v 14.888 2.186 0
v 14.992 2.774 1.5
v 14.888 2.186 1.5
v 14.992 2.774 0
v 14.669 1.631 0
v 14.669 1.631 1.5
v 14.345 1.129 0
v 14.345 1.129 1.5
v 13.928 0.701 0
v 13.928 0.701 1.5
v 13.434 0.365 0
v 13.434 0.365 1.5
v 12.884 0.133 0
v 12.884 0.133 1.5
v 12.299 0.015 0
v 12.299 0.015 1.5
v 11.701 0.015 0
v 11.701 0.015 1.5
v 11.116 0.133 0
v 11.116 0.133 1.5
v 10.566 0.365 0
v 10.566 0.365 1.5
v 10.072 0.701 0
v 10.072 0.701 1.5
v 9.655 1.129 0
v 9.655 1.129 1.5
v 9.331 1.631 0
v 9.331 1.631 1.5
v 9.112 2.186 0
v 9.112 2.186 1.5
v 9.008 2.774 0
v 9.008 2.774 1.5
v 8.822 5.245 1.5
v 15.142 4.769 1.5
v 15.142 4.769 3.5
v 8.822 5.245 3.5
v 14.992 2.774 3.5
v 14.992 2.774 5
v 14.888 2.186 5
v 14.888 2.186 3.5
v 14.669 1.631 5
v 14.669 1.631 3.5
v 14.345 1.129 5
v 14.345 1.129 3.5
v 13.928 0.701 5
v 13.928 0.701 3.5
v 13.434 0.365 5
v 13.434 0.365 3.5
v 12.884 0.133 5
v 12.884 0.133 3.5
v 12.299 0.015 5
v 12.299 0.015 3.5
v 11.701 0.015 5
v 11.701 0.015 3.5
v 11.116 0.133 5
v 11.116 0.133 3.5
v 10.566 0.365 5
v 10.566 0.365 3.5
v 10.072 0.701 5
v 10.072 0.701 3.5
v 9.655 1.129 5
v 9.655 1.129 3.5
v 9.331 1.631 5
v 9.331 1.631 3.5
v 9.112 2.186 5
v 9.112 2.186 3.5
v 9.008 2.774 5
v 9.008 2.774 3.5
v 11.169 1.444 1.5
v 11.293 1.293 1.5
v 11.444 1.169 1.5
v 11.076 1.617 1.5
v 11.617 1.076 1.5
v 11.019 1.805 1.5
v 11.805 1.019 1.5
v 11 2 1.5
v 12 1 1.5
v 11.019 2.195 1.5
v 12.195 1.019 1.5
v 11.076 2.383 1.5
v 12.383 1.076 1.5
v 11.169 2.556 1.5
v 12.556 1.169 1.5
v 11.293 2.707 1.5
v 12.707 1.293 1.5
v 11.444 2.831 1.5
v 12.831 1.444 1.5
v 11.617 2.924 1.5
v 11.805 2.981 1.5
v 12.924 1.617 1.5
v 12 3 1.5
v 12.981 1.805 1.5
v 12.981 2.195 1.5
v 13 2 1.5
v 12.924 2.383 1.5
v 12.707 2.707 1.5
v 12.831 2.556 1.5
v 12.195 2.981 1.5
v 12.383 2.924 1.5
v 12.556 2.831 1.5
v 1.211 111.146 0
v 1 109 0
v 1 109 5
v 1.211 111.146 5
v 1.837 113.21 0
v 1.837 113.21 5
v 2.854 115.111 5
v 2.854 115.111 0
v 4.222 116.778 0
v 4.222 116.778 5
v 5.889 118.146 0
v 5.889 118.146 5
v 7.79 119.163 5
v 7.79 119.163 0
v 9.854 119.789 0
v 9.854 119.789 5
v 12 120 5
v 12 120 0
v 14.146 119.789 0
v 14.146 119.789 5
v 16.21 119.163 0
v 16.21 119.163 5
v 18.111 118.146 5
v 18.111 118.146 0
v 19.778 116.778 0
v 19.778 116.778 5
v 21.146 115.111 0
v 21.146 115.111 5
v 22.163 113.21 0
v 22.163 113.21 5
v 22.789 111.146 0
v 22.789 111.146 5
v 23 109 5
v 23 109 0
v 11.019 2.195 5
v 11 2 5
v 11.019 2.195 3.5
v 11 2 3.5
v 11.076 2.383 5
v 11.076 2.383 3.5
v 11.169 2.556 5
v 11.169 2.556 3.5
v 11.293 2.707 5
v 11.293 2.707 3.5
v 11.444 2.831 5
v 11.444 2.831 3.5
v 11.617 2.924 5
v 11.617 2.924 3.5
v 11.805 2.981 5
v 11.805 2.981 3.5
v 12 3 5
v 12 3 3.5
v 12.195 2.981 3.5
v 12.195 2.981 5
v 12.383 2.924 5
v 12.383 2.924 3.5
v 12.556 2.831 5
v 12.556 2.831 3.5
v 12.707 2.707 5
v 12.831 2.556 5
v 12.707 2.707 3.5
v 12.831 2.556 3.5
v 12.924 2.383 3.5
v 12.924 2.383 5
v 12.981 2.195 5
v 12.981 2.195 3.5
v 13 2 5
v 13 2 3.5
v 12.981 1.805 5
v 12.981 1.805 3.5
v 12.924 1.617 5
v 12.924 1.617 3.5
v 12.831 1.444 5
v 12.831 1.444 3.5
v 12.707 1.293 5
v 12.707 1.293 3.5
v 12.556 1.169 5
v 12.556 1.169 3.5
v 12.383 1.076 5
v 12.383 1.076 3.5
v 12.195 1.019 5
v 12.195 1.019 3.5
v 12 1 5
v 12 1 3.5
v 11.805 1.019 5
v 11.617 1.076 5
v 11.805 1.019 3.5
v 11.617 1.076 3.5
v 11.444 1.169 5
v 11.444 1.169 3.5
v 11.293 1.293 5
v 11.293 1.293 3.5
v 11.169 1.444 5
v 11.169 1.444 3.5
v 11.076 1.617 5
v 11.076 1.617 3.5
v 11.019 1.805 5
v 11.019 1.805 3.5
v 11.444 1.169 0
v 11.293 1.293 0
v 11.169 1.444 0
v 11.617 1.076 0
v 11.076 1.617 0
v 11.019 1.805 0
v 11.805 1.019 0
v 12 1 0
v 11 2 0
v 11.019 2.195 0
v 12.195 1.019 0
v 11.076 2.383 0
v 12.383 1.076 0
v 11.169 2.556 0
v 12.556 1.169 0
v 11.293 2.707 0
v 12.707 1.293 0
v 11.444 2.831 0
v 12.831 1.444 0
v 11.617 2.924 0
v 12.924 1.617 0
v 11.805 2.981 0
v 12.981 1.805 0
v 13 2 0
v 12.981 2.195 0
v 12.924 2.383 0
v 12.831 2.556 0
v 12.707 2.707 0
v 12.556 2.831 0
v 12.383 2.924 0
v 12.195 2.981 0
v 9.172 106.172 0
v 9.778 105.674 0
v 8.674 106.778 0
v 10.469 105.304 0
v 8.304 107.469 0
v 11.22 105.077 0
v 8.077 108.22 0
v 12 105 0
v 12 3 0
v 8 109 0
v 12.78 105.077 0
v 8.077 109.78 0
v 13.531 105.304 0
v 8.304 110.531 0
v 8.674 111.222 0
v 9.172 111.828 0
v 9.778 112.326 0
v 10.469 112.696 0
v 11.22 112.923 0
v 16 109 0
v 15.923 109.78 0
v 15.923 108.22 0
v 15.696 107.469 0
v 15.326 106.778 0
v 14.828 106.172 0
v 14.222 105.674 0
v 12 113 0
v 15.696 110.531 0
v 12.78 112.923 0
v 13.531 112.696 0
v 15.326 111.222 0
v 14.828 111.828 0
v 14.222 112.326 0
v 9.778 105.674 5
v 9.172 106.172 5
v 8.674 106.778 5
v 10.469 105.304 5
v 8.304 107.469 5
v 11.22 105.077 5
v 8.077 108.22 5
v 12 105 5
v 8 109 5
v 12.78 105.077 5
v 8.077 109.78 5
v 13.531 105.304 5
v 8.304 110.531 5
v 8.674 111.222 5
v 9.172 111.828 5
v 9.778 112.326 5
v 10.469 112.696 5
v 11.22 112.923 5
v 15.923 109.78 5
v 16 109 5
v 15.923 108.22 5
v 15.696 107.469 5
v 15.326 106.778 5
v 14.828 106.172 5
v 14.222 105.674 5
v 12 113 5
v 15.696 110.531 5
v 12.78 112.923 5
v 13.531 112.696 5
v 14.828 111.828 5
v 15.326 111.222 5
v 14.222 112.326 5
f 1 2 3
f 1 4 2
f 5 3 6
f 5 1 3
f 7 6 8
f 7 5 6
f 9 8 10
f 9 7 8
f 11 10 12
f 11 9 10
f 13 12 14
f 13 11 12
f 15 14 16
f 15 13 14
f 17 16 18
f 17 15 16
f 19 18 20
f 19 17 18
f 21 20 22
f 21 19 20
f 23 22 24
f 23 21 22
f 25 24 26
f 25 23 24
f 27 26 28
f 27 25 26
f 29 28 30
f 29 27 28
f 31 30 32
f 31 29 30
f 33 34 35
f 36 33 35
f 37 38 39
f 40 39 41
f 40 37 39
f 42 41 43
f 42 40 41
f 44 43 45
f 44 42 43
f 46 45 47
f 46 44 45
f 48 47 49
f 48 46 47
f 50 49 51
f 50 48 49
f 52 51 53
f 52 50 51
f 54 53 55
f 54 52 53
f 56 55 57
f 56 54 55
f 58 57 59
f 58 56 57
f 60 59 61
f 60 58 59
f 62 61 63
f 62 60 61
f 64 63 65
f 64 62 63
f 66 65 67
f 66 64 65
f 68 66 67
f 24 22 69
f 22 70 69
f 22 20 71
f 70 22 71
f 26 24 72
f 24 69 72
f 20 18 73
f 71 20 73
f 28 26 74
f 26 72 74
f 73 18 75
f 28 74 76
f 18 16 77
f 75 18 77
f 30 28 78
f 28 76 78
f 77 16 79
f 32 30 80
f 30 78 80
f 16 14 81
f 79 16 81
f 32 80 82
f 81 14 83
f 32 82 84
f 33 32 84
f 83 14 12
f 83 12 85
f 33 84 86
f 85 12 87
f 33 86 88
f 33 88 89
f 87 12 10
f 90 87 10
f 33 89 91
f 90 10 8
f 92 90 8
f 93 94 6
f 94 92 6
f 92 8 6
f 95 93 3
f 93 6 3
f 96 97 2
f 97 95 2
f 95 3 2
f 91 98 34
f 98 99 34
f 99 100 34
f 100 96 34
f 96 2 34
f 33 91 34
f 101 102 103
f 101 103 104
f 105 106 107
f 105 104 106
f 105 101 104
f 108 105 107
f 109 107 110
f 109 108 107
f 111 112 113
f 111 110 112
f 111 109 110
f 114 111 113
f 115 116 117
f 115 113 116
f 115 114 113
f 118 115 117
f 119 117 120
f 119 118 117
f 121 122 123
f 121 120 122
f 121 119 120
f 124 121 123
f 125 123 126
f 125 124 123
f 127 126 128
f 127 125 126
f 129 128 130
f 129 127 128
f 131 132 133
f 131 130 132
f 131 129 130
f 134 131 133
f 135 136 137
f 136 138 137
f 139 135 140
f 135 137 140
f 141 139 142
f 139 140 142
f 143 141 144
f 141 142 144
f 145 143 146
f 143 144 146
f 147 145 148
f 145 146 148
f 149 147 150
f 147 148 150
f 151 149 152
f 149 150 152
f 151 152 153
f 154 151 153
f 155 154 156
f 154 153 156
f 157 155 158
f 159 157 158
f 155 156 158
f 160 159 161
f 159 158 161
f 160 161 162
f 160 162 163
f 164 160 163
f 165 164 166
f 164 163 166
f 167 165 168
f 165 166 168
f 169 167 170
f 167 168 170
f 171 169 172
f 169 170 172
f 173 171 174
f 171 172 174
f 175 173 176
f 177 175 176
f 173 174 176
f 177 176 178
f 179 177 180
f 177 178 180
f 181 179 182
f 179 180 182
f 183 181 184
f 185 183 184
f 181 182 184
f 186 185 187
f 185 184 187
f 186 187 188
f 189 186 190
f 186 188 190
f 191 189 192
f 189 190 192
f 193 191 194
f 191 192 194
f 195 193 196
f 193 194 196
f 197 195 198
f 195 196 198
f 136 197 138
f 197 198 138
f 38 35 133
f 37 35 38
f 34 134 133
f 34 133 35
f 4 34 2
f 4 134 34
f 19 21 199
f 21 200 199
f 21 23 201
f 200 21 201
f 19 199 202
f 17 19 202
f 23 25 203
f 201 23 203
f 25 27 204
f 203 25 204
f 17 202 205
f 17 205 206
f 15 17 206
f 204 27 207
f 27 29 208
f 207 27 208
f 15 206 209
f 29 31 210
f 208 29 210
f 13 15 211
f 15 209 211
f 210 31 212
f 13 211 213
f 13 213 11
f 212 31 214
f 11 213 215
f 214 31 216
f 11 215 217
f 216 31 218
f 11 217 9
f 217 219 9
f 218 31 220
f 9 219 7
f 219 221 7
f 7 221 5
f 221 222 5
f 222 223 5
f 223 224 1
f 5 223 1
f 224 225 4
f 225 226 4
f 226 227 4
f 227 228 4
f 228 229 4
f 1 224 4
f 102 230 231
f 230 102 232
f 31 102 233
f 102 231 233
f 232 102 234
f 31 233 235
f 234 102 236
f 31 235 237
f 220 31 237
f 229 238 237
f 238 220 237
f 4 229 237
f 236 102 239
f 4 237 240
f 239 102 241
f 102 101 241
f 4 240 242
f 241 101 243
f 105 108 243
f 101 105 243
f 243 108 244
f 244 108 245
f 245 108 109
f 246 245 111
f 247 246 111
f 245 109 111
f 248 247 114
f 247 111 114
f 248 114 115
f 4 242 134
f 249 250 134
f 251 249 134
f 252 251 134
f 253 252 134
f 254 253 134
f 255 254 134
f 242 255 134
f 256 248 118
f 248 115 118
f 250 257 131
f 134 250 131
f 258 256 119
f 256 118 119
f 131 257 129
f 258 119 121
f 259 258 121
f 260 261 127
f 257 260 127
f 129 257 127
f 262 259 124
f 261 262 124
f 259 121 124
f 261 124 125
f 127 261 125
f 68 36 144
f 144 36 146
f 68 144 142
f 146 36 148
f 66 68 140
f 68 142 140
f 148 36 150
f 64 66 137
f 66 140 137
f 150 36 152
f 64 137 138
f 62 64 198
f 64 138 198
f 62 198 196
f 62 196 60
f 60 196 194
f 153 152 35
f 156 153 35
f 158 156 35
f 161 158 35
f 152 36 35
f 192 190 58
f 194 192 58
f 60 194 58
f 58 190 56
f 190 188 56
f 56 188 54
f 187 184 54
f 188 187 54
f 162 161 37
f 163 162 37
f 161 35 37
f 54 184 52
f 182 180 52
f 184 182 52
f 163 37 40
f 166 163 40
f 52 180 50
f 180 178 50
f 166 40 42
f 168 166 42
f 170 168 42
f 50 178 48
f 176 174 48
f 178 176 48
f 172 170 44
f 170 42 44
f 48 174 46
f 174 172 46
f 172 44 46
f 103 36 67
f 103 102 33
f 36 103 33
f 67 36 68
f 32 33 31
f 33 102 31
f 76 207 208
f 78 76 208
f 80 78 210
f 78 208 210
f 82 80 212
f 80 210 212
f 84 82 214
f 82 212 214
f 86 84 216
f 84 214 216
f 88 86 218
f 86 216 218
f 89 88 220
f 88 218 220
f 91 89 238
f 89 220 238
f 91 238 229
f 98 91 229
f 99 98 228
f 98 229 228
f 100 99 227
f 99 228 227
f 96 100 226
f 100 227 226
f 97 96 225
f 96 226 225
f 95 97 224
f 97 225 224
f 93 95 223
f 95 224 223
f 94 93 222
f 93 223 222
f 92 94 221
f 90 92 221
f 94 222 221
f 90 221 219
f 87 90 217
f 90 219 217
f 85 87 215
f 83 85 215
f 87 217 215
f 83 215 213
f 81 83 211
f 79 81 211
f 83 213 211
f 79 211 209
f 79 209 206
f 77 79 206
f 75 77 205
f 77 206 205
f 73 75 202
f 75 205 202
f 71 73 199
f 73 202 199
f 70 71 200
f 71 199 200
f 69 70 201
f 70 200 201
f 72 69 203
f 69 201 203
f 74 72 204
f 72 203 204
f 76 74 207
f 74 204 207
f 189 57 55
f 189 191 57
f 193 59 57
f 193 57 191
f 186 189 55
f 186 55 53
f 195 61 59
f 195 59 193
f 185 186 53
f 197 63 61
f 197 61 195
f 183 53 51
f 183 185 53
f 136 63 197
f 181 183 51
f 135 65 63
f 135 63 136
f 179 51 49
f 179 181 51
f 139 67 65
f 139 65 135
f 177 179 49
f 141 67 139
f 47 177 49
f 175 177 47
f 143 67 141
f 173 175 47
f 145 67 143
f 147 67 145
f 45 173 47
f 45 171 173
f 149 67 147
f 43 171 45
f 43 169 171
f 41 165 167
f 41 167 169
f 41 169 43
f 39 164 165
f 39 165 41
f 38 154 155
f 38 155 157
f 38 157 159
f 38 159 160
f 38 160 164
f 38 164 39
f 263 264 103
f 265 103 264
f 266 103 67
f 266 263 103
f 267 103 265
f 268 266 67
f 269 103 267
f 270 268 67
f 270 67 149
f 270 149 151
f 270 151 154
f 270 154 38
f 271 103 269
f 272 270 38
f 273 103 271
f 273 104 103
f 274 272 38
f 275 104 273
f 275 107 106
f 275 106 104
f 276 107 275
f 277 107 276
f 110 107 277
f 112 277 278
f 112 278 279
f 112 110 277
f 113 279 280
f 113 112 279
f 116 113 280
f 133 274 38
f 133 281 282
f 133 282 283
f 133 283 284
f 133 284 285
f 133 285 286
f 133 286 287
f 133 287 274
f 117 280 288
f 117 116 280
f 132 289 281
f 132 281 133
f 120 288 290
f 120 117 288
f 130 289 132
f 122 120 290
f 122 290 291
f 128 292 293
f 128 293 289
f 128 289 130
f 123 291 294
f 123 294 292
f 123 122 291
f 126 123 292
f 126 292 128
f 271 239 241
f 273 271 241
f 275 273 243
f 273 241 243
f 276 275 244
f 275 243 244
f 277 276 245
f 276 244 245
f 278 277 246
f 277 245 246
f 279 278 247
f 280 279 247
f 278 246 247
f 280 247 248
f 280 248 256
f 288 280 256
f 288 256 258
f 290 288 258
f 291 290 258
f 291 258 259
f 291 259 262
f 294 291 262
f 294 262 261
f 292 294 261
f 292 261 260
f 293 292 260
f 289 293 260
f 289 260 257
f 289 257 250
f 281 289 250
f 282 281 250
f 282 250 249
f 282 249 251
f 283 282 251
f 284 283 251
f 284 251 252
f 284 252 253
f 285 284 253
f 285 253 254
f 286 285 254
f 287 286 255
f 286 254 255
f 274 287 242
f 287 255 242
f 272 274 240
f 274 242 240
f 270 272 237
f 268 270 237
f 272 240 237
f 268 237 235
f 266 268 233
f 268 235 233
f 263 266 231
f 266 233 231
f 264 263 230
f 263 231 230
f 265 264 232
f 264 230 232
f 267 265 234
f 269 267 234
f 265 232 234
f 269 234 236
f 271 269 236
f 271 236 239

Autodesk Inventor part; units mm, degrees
ref_plane "YZ Plane" through (0, 0, 0) normal (1, 0, 0) x (0, 1, 0)
ref_plane "XZ Plane" through (0, 0, 0) normal (0, 1, 0) x (-1, 0, 0)
ref_plane "XY Plane" through (0, 0, 0) normal (0, 0, 1) x (1, 0, 0)
sketch "Esquisse1" plane through (0, 0, 0) normal (0, 0, 1) x (1, 0, 0)
  arc A0 (22.8757, 107.3508) -> (1.1243, 107.3508) centre (12, 109) ccw
  arc A1 (9.0085, 2.7745) -> (14.9915, 2.7745) centre (12, 3) ccw
  line L0 (1, 109) -> (9.0085, 2.7745)
  line L1 (23, 109) -> (14.9915, 2.7745)
  point P0 (0, 0)
  dimension "d2" = 22
extrude "Extrusion1" add sketch "Esquisse1" along normal blind 5 contours L1 A1 L0 A0
sketch "Esquisse2" plane through (23, 109, 5) normal (0.9971701, -0.075178, 0) x (0, 0, -1)
  line L0 (5, -109.527) -> (0, -109.527) projected
  line L1 (2.5, -109.527) -> (1.5, -109.527)
  line L2 (2.5, -109.527) -> (3.5, -109.527)
  line L3 (3.5, -109.527) -> (3.5, -104.527)
  line L4 (3.5, -104.527) -> (1.5, -104.527)
  line L5 (1.5, -104.527) -> (1.5, -109.527)
  point P0 (5, -110.4206)
  dimension "d6" = 1
  dimension "d7" = 1
  dimension "d8" = 5
  dimension "d9" = 2
extrude "Extrusion2" cut sketch "Esquisse2" against normal through all
sketch "Esquisse3" plane through (0, 0, 0) normal (0, 0, -1) x (-1, 0, 0)
  arc A0 (-14.9915, 2.7745) -> (-9.0085, 2.7745) centre (-12, 3) ccw projected
  arc A1 (-1, 109) -> (-23, 109) centre (-12, 109) ccw projected
  circle A2 centre (-12, 109) radius 4
  arc A3 (-14.9915, 2.7745) -> (-9.0085, 2.7745) centre (-12, 3) ccw projected
  line L0 (-12, 0) -> (-12, 2)
  circle A4 centre (-12, 2) radius 1
  line L1 (-14.8284, 2) -> (-9.1716, 2)
  point P0 (0, 0)
  dimension "d13" = 8
  dimension "d24" = 2
  dimension "d25" = 2
  dimension "d26" = 5.6569
extrude "Extrusion3" cut sketch "Esquisse3" against normal through all contours L1 L0 A4 | A4 L1 | L0 L1 A4 | A2
properties part number "Jambe"
